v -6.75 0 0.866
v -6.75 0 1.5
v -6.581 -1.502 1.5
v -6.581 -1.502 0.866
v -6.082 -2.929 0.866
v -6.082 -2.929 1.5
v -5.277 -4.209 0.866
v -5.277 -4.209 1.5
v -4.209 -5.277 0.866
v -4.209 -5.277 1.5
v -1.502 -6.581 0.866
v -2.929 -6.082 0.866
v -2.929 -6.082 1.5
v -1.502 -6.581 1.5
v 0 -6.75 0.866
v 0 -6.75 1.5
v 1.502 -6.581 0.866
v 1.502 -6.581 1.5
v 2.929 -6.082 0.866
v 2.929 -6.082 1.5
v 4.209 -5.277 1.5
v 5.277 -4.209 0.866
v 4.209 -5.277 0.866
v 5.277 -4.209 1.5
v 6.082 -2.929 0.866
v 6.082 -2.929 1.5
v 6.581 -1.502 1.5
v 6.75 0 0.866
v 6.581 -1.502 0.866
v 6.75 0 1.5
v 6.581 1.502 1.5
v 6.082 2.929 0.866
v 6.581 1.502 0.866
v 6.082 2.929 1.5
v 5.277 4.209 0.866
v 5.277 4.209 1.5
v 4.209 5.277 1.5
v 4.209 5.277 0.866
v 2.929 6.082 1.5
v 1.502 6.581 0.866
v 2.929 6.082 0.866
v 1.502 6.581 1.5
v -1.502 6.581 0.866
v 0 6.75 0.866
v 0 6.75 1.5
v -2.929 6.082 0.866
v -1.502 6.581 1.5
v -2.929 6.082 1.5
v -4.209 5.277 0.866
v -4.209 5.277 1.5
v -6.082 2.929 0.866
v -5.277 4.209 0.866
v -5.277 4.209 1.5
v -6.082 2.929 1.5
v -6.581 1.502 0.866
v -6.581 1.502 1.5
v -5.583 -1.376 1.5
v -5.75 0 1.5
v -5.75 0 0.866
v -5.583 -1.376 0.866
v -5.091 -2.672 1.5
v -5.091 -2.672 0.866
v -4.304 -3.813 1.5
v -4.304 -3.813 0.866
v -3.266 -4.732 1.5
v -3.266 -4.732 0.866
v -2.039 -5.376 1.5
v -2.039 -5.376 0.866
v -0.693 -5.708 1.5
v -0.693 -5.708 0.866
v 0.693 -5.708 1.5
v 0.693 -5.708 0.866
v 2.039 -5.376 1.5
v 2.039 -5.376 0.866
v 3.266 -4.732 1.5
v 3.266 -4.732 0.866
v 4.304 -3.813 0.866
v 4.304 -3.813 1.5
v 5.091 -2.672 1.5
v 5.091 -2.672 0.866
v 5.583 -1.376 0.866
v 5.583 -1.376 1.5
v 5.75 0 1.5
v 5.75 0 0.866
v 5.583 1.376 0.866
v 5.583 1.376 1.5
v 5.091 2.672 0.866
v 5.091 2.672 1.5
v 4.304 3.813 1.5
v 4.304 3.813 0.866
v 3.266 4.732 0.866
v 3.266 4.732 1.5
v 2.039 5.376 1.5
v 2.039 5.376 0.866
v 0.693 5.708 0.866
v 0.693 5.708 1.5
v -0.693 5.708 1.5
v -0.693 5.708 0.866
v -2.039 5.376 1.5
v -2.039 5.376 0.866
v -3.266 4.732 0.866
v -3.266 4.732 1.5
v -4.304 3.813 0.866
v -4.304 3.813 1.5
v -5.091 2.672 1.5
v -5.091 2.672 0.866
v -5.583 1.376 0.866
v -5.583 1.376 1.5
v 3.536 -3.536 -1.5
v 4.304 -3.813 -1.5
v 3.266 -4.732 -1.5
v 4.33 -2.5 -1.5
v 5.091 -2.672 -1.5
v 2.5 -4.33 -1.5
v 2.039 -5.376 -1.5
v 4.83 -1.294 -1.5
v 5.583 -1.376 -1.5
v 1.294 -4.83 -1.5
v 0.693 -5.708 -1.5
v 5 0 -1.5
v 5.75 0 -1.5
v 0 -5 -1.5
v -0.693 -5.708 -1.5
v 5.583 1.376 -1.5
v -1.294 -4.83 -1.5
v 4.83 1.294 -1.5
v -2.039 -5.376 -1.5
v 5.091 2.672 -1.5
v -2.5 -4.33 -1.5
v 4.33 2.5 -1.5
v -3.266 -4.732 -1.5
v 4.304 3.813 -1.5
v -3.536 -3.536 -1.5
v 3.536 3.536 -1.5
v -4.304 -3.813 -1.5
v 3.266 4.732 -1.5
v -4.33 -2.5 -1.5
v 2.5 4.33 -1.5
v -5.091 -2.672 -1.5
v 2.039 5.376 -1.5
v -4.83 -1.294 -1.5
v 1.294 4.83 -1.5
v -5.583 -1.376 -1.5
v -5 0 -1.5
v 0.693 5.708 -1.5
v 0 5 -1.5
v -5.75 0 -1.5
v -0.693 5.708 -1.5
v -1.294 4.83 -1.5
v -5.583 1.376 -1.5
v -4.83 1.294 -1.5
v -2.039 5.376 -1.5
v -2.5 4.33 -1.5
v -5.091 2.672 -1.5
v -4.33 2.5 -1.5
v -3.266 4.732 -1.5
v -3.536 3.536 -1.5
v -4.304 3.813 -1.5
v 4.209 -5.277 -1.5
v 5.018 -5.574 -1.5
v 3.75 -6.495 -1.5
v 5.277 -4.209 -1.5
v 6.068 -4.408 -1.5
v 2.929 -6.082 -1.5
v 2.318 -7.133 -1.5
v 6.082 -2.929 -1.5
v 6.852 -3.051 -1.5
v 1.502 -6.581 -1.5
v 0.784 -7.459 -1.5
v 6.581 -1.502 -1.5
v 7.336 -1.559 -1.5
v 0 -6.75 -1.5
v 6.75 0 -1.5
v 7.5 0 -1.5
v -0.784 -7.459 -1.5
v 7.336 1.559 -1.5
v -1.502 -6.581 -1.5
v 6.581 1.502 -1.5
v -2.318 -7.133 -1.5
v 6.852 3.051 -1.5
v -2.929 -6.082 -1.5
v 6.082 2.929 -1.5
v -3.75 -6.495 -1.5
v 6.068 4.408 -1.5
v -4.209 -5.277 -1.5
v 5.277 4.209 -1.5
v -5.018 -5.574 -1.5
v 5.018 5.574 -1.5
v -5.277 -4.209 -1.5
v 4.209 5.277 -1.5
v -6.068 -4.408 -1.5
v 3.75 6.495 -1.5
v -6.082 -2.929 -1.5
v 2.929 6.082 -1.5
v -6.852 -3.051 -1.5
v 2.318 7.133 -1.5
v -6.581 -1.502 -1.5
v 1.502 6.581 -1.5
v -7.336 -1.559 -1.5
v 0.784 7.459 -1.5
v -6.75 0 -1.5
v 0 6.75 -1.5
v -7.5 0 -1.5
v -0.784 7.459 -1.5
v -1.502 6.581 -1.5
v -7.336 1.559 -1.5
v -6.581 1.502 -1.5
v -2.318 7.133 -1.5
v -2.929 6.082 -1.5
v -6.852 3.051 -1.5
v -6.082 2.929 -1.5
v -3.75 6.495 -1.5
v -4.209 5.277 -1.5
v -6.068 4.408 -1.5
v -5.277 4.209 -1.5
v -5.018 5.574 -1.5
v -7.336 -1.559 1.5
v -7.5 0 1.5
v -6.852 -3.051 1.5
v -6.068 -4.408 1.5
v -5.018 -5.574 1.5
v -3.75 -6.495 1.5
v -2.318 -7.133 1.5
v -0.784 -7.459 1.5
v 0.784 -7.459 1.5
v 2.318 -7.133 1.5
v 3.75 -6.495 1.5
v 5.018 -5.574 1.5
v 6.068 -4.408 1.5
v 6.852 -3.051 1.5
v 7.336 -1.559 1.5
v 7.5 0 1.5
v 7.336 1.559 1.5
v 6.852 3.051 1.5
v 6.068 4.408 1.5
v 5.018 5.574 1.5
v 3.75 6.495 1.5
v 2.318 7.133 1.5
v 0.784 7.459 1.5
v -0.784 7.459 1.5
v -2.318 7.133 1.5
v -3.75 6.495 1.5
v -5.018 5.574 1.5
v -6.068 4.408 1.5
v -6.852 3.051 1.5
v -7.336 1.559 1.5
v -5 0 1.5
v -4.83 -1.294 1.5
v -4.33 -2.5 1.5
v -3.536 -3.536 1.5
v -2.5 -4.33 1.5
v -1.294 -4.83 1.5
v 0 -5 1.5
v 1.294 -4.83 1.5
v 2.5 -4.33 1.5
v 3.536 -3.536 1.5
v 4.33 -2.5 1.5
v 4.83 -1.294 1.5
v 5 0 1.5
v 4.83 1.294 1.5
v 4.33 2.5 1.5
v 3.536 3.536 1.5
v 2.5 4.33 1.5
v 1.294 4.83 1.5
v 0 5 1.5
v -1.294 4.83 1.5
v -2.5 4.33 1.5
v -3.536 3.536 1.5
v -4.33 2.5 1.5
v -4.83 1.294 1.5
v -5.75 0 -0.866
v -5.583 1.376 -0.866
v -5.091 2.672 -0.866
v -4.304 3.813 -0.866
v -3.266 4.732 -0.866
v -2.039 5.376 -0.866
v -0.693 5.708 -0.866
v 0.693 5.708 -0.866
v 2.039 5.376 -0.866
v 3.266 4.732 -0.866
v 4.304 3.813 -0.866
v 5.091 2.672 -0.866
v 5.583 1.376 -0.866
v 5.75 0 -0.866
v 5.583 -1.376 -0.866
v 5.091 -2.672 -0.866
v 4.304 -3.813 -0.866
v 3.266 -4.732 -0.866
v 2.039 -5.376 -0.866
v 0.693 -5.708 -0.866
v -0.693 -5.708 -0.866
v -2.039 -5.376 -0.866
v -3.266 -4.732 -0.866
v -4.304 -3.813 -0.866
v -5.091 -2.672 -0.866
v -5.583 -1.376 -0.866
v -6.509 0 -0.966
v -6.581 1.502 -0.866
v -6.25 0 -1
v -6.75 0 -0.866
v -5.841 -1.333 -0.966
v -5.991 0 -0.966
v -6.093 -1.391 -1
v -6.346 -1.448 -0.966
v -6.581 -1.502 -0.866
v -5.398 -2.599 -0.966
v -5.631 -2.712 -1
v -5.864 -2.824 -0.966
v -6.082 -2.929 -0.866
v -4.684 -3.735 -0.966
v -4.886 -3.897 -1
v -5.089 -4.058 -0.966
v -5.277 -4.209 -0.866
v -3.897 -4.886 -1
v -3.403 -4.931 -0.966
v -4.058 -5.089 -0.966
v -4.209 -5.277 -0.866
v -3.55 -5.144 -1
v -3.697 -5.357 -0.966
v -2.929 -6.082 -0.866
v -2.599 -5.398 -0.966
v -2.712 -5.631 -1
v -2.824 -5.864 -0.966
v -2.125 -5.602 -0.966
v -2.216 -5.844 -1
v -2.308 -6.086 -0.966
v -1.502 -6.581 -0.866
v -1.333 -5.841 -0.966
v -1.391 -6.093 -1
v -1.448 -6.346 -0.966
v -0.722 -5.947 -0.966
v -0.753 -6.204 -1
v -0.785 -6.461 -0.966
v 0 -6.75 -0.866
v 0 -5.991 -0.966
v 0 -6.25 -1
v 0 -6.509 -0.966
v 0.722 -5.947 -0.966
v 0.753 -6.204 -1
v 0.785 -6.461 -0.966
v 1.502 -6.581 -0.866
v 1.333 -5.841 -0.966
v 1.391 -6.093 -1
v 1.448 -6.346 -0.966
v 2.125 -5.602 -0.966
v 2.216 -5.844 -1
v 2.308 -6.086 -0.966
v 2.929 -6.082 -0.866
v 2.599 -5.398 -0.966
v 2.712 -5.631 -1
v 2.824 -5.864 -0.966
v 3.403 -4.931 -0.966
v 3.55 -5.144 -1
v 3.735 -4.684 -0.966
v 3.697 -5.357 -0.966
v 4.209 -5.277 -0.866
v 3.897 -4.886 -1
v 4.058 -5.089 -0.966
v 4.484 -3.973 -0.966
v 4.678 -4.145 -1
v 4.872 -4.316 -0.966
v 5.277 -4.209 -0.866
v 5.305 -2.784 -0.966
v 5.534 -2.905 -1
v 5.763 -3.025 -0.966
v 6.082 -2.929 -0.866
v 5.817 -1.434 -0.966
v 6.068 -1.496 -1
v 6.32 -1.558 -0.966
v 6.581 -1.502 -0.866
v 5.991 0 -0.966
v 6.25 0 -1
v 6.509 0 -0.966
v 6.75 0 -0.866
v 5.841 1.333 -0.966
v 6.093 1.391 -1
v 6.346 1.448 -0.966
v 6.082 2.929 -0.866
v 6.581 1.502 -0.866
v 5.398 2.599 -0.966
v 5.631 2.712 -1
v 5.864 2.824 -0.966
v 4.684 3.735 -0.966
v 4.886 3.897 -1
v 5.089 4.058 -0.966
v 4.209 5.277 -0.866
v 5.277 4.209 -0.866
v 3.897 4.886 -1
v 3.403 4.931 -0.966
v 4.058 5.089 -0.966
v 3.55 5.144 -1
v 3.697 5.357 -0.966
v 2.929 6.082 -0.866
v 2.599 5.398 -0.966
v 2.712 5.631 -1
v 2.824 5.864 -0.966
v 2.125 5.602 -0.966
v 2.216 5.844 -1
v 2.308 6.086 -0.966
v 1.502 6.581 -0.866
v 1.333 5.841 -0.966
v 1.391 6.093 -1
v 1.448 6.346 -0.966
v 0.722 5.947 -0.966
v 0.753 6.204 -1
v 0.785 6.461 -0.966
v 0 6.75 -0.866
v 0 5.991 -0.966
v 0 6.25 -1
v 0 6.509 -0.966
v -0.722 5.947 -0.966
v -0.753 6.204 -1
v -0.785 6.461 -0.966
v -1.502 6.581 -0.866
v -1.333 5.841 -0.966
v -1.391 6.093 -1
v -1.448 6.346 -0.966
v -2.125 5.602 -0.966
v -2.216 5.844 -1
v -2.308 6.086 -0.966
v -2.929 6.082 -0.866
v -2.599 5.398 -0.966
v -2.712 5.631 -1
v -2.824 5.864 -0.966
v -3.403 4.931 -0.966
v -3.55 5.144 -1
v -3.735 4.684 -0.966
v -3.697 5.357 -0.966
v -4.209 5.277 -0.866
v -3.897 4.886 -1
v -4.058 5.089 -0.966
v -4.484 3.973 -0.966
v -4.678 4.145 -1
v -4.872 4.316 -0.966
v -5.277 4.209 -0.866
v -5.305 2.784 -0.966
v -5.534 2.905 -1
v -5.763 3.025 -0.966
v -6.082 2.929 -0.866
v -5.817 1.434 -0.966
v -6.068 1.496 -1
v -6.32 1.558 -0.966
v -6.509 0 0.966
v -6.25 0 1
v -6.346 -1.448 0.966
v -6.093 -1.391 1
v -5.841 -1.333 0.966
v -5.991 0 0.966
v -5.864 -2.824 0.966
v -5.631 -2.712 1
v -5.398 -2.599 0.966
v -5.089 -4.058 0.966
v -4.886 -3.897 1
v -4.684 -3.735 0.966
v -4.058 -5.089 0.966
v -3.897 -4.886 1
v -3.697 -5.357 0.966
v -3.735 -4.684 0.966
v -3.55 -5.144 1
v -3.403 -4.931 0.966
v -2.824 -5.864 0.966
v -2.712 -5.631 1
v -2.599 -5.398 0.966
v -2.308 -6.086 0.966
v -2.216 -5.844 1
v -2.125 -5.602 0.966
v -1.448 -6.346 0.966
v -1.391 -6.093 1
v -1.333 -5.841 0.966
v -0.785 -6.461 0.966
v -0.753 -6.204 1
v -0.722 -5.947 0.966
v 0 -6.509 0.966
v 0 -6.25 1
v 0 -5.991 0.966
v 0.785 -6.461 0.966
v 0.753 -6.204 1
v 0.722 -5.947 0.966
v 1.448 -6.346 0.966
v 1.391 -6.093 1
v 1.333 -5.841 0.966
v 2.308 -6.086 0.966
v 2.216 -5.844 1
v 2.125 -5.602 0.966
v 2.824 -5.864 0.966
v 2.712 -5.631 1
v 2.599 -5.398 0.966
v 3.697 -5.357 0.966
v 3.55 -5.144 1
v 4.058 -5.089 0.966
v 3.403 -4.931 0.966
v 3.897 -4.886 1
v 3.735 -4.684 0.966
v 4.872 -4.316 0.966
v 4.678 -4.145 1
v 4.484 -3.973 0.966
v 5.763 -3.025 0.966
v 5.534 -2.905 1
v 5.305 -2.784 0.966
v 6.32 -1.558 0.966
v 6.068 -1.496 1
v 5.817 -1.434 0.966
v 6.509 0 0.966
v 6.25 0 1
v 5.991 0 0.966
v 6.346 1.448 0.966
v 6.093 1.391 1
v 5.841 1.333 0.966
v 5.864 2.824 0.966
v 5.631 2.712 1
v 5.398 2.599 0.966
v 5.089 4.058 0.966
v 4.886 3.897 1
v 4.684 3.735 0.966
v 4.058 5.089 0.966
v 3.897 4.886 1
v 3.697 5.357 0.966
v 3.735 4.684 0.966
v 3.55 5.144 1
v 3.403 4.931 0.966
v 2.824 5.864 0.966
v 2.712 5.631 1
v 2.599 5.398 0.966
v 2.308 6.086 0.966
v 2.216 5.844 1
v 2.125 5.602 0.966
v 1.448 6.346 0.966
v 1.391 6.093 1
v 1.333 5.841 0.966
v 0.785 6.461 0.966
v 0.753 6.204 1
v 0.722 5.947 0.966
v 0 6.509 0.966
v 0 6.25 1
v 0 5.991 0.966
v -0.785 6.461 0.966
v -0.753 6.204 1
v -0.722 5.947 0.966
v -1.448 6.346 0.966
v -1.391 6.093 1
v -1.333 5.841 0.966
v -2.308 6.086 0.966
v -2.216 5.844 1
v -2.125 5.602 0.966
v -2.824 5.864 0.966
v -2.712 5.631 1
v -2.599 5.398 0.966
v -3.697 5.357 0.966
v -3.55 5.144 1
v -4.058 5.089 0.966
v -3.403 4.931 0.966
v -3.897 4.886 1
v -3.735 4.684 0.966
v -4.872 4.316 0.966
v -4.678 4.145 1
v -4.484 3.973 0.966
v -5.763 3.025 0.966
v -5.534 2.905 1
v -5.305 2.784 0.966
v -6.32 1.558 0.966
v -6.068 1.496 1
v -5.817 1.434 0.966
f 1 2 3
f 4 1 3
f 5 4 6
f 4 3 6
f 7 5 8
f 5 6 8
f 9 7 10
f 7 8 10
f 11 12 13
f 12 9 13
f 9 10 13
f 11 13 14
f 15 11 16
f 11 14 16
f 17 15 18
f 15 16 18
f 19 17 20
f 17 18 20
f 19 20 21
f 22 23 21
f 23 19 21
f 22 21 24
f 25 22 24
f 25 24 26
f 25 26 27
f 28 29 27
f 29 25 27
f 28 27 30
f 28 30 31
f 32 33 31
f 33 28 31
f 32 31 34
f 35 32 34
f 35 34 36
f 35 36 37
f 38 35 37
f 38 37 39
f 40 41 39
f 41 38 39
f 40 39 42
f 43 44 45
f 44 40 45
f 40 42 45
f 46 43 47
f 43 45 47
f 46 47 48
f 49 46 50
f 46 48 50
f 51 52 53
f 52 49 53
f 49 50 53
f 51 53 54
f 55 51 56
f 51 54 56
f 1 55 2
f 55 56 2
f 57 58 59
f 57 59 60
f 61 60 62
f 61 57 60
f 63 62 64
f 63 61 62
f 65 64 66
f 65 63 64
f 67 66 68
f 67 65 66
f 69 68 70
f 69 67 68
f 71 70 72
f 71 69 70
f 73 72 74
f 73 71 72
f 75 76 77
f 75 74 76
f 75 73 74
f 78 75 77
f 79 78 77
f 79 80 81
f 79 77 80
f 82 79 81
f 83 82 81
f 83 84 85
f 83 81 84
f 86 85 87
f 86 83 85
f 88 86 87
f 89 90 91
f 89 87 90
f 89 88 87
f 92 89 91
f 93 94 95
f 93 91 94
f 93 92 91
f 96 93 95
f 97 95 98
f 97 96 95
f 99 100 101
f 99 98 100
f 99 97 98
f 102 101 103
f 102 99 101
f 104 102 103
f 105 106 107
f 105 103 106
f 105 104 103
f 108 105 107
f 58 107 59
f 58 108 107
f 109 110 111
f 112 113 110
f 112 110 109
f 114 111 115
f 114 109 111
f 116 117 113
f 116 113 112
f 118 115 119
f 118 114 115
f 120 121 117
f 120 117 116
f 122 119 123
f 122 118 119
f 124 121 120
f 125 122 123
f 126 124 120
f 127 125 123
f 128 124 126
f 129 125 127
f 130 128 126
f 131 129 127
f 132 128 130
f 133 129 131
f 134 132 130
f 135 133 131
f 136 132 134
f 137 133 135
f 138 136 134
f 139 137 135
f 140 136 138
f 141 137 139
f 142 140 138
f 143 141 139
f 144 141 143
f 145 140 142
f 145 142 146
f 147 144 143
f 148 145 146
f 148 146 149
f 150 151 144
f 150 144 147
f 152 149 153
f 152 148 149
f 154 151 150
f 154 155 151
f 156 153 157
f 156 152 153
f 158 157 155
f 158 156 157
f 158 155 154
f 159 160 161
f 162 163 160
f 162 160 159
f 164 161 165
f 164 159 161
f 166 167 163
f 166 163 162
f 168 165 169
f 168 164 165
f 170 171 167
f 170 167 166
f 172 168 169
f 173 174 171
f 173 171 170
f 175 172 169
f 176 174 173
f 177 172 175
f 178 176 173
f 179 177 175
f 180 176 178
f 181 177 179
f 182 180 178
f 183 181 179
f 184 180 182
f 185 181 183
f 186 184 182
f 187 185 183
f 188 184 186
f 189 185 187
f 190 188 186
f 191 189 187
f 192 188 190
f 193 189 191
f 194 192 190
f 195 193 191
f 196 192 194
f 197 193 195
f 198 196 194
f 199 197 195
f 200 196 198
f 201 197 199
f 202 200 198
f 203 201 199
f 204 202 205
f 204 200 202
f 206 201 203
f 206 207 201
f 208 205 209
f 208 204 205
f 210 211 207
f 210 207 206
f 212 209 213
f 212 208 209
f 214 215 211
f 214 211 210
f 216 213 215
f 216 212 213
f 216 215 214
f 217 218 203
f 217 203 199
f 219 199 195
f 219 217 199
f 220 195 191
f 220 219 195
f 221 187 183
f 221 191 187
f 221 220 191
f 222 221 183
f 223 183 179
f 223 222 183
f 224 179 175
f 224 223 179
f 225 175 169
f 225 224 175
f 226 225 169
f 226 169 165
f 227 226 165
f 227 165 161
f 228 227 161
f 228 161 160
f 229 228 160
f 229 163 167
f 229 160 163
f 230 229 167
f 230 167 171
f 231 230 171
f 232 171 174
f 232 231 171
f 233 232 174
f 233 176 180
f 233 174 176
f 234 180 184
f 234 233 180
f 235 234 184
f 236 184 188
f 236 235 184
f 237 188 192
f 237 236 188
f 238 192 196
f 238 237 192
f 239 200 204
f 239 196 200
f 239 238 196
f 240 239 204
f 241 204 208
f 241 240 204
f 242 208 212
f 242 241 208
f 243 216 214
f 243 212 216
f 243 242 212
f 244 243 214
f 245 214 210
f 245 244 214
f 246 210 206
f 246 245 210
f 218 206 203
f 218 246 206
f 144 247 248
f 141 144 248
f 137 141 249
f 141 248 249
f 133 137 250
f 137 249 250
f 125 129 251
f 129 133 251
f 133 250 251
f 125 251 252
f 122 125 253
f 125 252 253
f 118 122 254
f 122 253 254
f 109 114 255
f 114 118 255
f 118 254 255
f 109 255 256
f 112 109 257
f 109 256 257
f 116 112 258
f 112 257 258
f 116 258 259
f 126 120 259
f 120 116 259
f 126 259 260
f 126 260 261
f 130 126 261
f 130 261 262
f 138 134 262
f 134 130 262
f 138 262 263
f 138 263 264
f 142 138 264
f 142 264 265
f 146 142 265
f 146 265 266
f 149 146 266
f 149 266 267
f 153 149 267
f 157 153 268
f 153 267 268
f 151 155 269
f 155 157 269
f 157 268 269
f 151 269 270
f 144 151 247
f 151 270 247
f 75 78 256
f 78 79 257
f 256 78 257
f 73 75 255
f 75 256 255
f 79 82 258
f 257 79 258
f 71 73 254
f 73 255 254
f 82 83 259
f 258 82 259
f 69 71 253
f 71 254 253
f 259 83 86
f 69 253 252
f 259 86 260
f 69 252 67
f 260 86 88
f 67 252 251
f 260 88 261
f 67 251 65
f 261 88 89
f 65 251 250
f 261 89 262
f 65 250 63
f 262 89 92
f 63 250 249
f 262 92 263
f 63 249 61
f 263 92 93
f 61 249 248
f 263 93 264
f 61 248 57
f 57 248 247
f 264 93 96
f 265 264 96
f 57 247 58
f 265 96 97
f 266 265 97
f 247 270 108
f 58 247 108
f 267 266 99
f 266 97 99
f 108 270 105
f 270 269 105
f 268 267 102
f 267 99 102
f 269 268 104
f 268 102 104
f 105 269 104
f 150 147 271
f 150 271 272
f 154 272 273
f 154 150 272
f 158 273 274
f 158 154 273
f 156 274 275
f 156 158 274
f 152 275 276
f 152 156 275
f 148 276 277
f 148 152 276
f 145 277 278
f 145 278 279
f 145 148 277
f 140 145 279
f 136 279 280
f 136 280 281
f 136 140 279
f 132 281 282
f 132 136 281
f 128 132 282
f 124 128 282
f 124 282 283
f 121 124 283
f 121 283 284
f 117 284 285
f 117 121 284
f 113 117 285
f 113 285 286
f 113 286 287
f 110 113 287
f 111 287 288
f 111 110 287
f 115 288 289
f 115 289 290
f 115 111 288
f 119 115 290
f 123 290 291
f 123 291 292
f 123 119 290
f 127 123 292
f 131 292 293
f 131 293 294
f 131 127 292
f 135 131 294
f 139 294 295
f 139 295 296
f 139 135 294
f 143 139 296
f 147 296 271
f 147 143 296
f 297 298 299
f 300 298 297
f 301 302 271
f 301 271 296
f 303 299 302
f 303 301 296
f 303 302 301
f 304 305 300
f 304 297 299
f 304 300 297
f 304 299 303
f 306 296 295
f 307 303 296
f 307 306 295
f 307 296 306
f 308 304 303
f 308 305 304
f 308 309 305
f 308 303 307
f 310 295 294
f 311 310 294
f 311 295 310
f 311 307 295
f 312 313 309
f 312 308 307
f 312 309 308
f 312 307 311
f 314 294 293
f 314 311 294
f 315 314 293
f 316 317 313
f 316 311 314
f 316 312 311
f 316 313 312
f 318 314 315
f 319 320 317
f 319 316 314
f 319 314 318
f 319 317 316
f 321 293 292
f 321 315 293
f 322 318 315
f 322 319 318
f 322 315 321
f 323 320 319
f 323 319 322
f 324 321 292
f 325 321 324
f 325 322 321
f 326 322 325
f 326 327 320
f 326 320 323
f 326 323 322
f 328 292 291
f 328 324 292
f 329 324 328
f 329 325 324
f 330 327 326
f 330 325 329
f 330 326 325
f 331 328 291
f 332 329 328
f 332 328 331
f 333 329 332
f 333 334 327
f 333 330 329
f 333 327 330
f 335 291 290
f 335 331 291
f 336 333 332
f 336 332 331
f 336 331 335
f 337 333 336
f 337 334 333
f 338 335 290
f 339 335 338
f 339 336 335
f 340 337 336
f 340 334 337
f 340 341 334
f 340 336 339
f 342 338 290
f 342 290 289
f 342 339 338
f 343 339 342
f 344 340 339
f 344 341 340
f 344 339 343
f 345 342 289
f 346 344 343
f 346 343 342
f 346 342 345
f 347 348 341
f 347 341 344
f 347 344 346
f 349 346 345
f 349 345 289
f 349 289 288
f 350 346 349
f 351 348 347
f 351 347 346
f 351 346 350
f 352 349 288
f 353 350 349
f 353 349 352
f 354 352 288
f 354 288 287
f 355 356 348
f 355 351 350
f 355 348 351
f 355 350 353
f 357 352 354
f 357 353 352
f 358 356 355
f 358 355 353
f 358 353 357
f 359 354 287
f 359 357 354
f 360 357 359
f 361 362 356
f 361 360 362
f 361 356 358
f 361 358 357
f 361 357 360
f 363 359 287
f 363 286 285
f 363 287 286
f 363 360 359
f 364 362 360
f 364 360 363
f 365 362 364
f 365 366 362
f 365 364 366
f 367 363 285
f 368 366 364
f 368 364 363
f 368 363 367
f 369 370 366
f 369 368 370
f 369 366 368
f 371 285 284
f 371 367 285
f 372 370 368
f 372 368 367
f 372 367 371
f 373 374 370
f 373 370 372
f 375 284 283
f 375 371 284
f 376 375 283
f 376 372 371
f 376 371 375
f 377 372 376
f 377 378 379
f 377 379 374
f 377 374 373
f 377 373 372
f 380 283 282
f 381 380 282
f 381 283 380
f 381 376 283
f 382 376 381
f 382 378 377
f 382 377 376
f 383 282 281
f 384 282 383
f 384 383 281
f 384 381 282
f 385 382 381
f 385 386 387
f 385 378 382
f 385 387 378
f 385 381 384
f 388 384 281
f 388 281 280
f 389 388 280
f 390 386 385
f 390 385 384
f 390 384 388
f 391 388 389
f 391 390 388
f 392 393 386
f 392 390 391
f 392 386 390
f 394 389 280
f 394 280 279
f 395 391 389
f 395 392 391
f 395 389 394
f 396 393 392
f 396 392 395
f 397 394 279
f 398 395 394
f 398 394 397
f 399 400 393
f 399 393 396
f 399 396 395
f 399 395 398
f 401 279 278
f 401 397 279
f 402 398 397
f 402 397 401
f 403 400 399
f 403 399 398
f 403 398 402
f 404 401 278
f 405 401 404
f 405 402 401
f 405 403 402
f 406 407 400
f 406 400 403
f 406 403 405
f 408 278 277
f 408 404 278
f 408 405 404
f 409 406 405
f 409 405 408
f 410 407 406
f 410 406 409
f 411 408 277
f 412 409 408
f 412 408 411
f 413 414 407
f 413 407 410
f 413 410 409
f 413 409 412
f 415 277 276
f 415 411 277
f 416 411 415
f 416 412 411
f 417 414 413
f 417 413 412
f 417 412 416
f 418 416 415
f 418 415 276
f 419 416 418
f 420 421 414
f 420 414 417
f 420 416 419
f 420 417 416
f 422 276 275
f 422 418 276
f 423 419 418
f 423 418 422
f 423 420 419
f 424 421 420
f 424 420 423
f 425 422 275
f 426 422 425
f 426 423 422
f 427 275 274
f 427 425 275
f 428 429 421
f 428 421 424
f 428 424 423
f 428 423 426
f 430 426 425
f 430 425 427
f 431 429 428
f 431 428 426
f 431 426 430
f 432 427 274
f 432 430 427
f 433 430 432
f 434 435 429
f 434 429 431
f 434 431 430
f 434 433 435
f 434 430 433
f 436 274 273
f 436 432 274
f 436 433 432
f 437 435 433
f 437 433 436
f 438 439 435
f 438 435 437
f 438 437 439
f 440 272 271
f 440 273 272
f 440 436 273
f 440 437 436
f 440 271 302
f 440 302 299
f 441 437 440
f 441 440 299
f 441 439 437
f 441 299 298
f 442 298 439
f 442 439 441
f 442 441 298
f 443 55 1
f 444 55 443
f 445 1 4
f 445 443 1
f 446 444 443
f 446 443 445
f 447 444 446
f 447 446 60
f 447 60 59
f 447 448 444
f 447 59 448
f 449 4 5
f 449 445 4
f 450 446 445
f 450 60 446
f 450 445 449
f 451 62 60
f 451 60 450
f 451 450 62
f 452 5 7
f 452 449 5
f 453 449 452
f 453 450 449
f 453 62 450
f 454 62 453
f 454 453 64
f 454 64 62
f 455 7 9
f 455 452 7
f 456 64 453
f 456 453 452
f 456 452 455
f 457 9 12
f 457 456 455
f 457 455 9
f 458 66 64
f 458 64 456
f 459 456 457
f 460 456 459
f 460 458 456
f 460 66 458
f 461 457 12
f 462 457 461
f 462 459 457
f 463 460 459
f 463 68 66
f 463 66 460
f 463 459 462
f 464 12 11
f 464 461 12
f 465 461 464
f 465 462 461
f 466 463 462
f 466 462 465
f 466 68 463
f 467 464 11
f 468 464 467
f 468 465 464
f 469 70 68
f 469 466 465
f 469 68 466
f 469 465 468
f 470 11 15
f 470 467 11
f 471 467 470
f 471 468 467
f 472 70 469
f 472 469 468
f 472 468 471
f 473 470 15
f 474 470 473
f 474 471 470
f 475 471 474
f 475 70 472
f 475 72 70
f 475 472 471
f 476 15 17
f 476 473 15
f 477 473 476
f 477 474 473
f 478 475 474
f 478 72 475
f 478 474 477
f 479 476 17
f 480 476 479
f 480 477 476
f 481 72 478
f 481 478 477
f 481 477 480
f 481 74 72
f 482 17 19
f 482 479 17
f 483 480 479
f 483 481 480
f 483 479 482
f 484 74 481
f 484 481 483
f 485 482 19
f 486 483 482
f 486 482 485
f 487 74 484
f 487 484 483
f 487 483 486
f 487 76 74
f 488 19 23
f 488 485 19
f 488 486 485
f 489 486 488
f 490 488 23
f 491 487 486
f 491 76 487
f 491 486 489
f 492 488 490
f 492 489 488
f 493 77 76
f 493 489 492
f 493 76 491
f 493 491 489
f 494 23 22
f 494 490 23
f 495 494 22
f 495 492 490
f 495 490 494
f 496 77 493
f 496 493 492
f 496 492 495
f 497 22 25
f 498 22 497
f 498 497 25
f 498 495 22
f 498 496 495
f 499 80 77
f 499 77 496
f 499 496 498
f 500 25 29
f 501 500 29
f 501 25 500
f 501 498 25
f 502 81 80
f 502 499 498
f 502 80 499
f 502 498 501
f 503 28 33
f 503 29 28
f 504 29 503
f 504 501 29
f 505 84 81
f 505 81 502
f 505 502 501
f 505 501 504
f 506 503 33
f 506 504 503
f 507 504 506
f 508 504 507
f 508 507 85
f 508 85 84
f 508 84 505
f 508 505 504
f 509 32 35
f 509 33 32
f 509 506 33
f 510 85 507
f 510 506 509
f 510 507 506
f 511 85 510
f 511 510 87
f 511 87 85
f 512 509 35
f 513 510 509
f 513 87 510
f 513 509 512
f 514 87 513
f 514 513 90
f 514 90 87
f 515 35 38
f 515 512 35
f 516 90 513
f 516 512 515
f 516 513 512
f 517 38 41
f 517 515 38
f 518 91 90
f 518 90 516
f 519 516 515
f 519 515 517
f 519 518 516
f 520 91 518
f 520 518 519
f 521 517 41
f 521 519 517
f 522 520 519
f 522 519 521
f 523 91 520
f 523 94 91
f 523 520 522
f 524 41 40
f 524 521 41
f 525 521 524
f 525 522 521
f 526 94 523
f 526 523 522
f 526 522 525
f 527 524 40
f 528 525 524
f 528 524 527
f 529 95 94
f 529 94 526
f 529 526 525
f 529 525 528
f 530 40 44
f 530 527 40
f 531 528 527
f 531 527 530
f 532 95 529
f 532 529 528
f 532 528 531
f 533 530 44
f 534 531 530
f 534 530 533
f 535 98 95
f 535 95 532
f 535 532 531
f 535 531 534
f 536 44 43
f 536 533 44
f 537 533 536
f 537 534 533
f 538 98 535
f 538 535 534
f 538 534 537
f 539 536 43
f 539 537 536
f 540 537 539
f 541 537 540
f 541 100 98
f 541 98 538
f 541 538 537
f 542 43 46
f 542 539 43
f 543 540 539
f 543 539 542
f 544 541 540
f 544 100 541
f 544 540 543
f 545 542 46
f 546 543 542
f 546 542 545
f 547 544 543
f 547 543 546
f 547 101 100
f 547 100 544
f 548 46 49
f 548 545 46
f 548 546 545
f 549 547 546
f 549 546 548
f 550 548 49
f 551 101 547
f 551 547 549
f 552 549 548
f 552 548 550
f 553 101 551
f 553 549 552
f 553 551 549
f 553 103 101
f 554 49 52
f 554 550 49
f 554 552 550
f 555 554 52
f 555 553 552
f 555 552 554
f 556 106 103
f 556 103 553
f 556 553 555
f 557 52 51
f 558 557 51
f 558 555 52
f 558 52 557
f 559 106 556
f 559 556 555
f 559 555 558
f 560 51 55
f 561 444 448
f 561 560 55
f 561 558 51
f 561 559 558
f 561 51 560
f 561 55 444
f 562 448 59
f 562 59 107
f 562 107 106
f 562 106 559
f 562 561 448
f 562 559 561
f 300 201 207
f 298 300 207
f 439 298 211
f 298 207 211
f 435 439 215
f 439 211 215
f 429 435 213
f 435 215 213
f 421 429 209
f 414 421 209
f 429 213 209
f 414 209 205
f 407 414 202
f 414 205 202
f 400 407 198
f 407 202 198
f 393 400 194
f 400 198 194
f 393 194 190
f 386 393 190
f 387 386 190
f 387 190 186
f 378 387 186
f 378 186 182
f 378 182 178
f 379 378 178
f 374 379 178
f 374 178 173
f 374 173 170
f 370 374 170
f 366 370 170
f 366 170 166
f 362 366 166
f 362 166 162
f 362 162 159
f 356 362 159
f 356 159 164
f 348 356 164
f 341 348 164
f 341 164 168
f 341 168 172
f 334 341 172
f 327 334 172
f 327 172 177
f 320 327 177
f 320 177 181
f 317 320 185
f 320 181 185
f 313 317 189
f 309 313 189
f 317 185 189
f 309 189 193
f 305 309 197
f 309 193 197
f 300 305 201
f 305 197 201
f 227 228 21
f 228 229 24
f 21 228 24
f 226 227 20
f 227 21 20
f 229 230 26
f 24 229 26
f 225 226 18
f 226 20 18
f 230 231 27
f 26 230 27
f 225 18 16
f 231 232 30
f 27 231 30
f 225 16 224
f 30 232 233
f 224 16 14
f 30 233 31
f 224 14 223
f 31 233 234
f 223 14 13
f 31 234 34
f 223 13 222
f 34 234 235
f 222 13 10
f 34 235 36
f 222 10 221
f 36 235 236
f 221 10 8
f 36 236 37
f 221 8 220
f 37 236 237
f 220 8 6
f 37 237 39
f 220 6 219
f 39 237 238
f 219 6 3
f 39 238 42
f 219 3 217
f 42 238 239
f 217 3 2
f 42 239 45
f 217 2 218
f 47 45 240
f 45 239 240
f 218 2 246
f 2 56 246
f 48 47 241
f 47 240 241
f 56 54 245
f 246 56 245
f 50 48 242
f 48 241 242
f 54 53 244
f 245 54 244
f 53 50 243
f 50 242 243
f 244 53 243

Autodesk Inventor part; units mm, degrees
ref_plane "YZ Plane" through (0, 0, 0) normal (1, 0, 0) x (0, 1, 0)
ref_plane "XZ Plane" through (0, 0, 0) normal (0, 1, 0) x (-1, 0, 0)
ref_plane "XY Plane" through (0, 0, 0) normal (0, 0, 1) x (1, 0, 0)
sketch "スケッチ1" plane through (0, 0, 0) normal (0, 1, 0) x (-1, 0, 0)
  line L0 (0, 0) -> (0, -112.7681) construction
  line L1 (0, -112.7681) -> (0, 117.0869) construction
  line L2 (0, -1.5) -> (5, -1.5) construction
  line L3 (5, -1.5) -> (5, 1.5)
  line L4 (0, 1.5) -> (5, 1.5) construction
  line L5 (7.5, -1.5) -> (7.5, 1.5)
  line L6 (7.5, -1.5) -> (5, 1.5) construction
  line L7 (5, -1.5) -> (7.5, 1.5) construction
  line L8 (7.116, -1.5) -> (5.384, 1.5) construction
  line L9 (5.384, -1.5) -> (7.116, 1.5) construction
  line L10 (6.25, 0) -> (6.25, 1.5) construction
  line L11 (6.75, -0.866) -> (6.75, -1.5)
  line L12 (5.75, -0.866) -> (5.75, -1.5)
  line L13 (6.75, 0.866) -> (6.75, 1.5)
  line L14 (5.75, 0.866) -> (5.75, 1.5)
  line L15 (5, 1.5) -> (5.75, 1.5)
  line L16 (6.75, 1.5) -> (7.5, 1.5)
  arc A0 (6.75, 0.866) -> (5.75, 0.866) centre (6.25, 0) ccw
  arc A1 (5.75, 0.866) -> (5.75, -0.866) centre (6.25, 0) ccw
  arc A2 (5.75, -0.866) -> (6.8902, -0.7682) centre (6.25, 0) ccw
  arc A3 (6.8902, -0.7682) -> (6.75, 0.866) centre (6.25, 0) ccw
  line L17 (5, -1.5) -> (5.75, -1.5)
  line L18 (6.75, -1.5) -> (7.5, -1.5)
  point P0 (6.25, 0)
  dimension "d0" = 5
  dimension "d1" = 1.5
  dimension "d2" = 1.5
  dimension "d3" = 7.5
  dimension "d6" = 30
  dimension "d7" = 30
  dimension "d11" = 1
revolve "回転2" add sketch "スケッチ1" angle 360 about axis through (0, 0, 0) along (0, 0, -1)
properties part number "ベアリング10.15" material "ステンレス鋼"
